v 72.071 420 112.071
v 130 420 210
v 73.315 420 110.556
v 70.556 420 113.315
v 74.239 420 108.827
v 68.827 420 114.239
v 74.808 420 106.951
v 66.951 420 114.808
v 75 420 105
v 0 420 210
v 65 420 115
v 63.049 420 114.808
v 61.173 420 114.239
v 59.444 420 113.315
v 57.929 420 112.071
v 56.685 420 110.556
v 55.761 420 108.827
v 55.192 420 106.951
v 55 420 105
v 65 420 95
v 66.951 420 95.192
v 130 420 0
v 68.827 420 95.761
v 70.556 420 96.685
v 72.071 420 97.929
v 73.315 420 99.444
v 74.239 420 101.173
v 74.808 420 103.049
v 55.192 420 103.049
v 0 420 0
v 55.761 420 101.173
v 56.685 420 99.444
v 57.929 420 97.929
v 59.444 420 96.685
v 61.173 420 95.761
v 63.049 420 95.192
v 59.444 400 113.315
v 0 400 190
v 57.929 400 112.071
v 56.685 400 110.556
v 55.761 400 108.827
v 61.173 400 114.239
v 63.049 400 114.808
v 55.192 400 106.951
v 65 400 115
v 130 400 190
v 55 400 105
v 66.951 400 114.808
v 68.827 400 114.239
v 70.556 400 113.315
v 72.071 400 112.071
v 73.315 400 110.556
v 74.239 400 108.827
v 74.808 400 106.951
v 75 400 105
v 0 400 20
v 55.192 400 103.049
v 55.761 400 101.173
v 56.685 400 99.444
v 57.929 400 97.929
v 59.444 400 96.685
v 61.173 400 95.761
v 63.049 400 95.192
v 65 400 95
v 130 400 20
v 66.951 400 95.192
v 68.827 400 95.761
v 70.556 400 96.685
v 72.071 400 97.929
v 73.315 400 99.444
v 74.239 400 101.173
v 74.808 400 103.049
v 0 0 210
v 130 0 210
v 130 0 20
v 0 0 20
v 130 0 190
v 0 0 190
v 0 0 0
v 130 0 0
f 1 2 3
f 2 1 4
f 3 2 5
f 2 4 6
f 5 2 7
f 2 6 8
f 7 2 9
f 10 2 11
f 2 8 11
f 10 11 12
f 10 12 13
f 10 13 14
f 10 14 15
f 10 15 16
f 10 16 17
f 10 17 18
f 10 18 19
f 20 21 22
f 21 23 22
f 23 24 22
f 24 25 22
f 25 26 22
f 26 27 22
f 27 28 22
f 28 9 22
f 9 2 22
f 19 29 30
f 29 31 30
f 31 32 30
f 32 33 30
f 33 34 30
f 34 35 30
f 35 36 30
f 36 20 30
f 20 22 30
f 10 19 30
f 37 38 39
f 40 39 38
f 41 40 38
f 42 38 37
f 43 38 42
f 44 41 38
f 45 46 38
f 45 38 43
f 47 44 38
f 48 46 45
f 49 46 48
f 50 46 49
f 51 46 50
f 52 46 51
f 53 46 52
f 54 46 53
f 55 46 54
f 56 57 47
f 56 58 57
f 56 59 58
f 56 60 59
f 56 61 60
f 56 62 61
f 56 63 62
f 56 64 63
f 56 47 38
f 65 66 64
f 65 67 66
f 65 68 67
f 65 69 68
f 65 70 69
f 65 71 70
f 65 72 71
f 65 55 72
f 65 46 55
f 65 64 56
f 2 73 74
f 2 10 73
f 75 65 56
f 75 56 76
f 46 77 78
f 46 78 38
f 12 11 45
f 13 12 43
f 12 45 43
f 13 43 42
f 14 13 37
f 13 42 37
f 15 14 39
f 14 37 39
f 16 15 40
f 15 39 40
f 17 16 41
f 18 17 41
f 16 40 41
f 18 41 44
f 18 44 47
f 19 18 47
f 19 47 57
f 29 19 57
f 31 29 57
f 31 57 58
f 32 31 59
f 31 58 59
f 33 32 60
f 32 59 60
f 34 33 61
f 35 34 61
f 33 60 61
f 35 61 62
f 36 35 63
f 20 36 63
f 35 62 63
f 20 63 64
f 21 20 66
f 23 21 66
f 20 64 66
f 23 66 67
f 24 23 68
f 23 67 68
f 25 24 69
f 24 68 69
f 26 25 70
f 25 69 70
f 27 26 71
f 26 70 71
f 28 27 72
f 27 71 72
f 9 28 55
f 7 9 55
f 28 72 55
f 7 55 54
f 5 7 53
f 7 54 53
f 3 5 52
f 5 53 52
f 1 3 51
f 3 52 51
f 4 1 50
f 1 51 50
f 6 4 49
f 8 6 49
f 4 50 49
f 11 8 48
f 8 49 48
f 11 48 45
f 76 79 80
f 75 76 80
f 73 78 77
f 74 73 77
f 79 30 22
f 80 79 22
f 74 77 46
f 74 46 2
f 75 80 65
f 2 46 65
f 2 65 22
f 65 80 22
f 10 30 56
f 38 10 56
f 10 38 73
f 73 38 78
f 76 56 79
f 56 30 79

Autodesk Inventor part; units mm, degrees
ref_plane "YZ Plane" through (0, 0, 0) normal (1, 0, 0) x (0, 1, 0)
ref_plane "XZ Plane" through (0, 0, 0) normal (0, 1, 0) x (-1, 0, 0)
ref_plane "XY Plane" through (0, 0, 0) normal (0, 0, 1) x (1, 0, 0)
sketch "Boceto1" plane through (0, 0, 0) normal (0, 0, 1) x (1, 0, 0)
  line L0 (0, 0) -> (130, 0)
  line L1 (130, 0) -> (130, 420)
  line L2 (130, 420) -> (0, 420)
  line L3 (0, 420) -> (0, 0)
  circle A0 centre (65, 210) radius 10
  dimension "d0" = 130
  dimension "d1" = 420
  dimension "d2" = 130
  dimension "d10" = 20
extrude "Extrusión1" add sketch "Boceto1" along normal blind 210 contours L3 L2 L1 L0 | A0
sketch "Boceto2" plane through (130, 0, 0) normal (1, 0, 0) x (0, 0, -1)
  line L0 (-210, 420) -> (-210, 0) projected
  line L1 (-210, 0) -> (-190, 0)
  line L2 (0, 0) -> (-210, 0) projected
  line L3 (-190, 0) -> (-190, 400)
  line L4 (-190, 400) -> (-20, 400)
  line L5 (0, 420) -> (0, 0) projected
  line L6 (-20, 400) -> (-20, 0)
  line L7 (-20, 0) -> (0, 0)
  dimension "d5" = 20
  dimension "d6" = 400
  dimension "d7" = 170
extrude "Extrusión2" cut sketch "Boceto2" against normal blind 210
sketch "Boceto3" plane through (0, 420, 0) normal (0, 1, 0) x (1, 0, 0)
  line L0 (130, 0) -> (0, 0) projected
  line L1 (130, -210) -> (0, -210) projected
  line L2 (0, 0) -> (130, -210)
  line L3 (130, 0) -> (0, -210)
  circle A0 centre (65, -105) radius 10
  dimension "d11" = 20
hole "Agujero1" at (65, 420, 105) direction (0, -1, 0) diameter 20 end through all
properties part number "Soporteguia"
